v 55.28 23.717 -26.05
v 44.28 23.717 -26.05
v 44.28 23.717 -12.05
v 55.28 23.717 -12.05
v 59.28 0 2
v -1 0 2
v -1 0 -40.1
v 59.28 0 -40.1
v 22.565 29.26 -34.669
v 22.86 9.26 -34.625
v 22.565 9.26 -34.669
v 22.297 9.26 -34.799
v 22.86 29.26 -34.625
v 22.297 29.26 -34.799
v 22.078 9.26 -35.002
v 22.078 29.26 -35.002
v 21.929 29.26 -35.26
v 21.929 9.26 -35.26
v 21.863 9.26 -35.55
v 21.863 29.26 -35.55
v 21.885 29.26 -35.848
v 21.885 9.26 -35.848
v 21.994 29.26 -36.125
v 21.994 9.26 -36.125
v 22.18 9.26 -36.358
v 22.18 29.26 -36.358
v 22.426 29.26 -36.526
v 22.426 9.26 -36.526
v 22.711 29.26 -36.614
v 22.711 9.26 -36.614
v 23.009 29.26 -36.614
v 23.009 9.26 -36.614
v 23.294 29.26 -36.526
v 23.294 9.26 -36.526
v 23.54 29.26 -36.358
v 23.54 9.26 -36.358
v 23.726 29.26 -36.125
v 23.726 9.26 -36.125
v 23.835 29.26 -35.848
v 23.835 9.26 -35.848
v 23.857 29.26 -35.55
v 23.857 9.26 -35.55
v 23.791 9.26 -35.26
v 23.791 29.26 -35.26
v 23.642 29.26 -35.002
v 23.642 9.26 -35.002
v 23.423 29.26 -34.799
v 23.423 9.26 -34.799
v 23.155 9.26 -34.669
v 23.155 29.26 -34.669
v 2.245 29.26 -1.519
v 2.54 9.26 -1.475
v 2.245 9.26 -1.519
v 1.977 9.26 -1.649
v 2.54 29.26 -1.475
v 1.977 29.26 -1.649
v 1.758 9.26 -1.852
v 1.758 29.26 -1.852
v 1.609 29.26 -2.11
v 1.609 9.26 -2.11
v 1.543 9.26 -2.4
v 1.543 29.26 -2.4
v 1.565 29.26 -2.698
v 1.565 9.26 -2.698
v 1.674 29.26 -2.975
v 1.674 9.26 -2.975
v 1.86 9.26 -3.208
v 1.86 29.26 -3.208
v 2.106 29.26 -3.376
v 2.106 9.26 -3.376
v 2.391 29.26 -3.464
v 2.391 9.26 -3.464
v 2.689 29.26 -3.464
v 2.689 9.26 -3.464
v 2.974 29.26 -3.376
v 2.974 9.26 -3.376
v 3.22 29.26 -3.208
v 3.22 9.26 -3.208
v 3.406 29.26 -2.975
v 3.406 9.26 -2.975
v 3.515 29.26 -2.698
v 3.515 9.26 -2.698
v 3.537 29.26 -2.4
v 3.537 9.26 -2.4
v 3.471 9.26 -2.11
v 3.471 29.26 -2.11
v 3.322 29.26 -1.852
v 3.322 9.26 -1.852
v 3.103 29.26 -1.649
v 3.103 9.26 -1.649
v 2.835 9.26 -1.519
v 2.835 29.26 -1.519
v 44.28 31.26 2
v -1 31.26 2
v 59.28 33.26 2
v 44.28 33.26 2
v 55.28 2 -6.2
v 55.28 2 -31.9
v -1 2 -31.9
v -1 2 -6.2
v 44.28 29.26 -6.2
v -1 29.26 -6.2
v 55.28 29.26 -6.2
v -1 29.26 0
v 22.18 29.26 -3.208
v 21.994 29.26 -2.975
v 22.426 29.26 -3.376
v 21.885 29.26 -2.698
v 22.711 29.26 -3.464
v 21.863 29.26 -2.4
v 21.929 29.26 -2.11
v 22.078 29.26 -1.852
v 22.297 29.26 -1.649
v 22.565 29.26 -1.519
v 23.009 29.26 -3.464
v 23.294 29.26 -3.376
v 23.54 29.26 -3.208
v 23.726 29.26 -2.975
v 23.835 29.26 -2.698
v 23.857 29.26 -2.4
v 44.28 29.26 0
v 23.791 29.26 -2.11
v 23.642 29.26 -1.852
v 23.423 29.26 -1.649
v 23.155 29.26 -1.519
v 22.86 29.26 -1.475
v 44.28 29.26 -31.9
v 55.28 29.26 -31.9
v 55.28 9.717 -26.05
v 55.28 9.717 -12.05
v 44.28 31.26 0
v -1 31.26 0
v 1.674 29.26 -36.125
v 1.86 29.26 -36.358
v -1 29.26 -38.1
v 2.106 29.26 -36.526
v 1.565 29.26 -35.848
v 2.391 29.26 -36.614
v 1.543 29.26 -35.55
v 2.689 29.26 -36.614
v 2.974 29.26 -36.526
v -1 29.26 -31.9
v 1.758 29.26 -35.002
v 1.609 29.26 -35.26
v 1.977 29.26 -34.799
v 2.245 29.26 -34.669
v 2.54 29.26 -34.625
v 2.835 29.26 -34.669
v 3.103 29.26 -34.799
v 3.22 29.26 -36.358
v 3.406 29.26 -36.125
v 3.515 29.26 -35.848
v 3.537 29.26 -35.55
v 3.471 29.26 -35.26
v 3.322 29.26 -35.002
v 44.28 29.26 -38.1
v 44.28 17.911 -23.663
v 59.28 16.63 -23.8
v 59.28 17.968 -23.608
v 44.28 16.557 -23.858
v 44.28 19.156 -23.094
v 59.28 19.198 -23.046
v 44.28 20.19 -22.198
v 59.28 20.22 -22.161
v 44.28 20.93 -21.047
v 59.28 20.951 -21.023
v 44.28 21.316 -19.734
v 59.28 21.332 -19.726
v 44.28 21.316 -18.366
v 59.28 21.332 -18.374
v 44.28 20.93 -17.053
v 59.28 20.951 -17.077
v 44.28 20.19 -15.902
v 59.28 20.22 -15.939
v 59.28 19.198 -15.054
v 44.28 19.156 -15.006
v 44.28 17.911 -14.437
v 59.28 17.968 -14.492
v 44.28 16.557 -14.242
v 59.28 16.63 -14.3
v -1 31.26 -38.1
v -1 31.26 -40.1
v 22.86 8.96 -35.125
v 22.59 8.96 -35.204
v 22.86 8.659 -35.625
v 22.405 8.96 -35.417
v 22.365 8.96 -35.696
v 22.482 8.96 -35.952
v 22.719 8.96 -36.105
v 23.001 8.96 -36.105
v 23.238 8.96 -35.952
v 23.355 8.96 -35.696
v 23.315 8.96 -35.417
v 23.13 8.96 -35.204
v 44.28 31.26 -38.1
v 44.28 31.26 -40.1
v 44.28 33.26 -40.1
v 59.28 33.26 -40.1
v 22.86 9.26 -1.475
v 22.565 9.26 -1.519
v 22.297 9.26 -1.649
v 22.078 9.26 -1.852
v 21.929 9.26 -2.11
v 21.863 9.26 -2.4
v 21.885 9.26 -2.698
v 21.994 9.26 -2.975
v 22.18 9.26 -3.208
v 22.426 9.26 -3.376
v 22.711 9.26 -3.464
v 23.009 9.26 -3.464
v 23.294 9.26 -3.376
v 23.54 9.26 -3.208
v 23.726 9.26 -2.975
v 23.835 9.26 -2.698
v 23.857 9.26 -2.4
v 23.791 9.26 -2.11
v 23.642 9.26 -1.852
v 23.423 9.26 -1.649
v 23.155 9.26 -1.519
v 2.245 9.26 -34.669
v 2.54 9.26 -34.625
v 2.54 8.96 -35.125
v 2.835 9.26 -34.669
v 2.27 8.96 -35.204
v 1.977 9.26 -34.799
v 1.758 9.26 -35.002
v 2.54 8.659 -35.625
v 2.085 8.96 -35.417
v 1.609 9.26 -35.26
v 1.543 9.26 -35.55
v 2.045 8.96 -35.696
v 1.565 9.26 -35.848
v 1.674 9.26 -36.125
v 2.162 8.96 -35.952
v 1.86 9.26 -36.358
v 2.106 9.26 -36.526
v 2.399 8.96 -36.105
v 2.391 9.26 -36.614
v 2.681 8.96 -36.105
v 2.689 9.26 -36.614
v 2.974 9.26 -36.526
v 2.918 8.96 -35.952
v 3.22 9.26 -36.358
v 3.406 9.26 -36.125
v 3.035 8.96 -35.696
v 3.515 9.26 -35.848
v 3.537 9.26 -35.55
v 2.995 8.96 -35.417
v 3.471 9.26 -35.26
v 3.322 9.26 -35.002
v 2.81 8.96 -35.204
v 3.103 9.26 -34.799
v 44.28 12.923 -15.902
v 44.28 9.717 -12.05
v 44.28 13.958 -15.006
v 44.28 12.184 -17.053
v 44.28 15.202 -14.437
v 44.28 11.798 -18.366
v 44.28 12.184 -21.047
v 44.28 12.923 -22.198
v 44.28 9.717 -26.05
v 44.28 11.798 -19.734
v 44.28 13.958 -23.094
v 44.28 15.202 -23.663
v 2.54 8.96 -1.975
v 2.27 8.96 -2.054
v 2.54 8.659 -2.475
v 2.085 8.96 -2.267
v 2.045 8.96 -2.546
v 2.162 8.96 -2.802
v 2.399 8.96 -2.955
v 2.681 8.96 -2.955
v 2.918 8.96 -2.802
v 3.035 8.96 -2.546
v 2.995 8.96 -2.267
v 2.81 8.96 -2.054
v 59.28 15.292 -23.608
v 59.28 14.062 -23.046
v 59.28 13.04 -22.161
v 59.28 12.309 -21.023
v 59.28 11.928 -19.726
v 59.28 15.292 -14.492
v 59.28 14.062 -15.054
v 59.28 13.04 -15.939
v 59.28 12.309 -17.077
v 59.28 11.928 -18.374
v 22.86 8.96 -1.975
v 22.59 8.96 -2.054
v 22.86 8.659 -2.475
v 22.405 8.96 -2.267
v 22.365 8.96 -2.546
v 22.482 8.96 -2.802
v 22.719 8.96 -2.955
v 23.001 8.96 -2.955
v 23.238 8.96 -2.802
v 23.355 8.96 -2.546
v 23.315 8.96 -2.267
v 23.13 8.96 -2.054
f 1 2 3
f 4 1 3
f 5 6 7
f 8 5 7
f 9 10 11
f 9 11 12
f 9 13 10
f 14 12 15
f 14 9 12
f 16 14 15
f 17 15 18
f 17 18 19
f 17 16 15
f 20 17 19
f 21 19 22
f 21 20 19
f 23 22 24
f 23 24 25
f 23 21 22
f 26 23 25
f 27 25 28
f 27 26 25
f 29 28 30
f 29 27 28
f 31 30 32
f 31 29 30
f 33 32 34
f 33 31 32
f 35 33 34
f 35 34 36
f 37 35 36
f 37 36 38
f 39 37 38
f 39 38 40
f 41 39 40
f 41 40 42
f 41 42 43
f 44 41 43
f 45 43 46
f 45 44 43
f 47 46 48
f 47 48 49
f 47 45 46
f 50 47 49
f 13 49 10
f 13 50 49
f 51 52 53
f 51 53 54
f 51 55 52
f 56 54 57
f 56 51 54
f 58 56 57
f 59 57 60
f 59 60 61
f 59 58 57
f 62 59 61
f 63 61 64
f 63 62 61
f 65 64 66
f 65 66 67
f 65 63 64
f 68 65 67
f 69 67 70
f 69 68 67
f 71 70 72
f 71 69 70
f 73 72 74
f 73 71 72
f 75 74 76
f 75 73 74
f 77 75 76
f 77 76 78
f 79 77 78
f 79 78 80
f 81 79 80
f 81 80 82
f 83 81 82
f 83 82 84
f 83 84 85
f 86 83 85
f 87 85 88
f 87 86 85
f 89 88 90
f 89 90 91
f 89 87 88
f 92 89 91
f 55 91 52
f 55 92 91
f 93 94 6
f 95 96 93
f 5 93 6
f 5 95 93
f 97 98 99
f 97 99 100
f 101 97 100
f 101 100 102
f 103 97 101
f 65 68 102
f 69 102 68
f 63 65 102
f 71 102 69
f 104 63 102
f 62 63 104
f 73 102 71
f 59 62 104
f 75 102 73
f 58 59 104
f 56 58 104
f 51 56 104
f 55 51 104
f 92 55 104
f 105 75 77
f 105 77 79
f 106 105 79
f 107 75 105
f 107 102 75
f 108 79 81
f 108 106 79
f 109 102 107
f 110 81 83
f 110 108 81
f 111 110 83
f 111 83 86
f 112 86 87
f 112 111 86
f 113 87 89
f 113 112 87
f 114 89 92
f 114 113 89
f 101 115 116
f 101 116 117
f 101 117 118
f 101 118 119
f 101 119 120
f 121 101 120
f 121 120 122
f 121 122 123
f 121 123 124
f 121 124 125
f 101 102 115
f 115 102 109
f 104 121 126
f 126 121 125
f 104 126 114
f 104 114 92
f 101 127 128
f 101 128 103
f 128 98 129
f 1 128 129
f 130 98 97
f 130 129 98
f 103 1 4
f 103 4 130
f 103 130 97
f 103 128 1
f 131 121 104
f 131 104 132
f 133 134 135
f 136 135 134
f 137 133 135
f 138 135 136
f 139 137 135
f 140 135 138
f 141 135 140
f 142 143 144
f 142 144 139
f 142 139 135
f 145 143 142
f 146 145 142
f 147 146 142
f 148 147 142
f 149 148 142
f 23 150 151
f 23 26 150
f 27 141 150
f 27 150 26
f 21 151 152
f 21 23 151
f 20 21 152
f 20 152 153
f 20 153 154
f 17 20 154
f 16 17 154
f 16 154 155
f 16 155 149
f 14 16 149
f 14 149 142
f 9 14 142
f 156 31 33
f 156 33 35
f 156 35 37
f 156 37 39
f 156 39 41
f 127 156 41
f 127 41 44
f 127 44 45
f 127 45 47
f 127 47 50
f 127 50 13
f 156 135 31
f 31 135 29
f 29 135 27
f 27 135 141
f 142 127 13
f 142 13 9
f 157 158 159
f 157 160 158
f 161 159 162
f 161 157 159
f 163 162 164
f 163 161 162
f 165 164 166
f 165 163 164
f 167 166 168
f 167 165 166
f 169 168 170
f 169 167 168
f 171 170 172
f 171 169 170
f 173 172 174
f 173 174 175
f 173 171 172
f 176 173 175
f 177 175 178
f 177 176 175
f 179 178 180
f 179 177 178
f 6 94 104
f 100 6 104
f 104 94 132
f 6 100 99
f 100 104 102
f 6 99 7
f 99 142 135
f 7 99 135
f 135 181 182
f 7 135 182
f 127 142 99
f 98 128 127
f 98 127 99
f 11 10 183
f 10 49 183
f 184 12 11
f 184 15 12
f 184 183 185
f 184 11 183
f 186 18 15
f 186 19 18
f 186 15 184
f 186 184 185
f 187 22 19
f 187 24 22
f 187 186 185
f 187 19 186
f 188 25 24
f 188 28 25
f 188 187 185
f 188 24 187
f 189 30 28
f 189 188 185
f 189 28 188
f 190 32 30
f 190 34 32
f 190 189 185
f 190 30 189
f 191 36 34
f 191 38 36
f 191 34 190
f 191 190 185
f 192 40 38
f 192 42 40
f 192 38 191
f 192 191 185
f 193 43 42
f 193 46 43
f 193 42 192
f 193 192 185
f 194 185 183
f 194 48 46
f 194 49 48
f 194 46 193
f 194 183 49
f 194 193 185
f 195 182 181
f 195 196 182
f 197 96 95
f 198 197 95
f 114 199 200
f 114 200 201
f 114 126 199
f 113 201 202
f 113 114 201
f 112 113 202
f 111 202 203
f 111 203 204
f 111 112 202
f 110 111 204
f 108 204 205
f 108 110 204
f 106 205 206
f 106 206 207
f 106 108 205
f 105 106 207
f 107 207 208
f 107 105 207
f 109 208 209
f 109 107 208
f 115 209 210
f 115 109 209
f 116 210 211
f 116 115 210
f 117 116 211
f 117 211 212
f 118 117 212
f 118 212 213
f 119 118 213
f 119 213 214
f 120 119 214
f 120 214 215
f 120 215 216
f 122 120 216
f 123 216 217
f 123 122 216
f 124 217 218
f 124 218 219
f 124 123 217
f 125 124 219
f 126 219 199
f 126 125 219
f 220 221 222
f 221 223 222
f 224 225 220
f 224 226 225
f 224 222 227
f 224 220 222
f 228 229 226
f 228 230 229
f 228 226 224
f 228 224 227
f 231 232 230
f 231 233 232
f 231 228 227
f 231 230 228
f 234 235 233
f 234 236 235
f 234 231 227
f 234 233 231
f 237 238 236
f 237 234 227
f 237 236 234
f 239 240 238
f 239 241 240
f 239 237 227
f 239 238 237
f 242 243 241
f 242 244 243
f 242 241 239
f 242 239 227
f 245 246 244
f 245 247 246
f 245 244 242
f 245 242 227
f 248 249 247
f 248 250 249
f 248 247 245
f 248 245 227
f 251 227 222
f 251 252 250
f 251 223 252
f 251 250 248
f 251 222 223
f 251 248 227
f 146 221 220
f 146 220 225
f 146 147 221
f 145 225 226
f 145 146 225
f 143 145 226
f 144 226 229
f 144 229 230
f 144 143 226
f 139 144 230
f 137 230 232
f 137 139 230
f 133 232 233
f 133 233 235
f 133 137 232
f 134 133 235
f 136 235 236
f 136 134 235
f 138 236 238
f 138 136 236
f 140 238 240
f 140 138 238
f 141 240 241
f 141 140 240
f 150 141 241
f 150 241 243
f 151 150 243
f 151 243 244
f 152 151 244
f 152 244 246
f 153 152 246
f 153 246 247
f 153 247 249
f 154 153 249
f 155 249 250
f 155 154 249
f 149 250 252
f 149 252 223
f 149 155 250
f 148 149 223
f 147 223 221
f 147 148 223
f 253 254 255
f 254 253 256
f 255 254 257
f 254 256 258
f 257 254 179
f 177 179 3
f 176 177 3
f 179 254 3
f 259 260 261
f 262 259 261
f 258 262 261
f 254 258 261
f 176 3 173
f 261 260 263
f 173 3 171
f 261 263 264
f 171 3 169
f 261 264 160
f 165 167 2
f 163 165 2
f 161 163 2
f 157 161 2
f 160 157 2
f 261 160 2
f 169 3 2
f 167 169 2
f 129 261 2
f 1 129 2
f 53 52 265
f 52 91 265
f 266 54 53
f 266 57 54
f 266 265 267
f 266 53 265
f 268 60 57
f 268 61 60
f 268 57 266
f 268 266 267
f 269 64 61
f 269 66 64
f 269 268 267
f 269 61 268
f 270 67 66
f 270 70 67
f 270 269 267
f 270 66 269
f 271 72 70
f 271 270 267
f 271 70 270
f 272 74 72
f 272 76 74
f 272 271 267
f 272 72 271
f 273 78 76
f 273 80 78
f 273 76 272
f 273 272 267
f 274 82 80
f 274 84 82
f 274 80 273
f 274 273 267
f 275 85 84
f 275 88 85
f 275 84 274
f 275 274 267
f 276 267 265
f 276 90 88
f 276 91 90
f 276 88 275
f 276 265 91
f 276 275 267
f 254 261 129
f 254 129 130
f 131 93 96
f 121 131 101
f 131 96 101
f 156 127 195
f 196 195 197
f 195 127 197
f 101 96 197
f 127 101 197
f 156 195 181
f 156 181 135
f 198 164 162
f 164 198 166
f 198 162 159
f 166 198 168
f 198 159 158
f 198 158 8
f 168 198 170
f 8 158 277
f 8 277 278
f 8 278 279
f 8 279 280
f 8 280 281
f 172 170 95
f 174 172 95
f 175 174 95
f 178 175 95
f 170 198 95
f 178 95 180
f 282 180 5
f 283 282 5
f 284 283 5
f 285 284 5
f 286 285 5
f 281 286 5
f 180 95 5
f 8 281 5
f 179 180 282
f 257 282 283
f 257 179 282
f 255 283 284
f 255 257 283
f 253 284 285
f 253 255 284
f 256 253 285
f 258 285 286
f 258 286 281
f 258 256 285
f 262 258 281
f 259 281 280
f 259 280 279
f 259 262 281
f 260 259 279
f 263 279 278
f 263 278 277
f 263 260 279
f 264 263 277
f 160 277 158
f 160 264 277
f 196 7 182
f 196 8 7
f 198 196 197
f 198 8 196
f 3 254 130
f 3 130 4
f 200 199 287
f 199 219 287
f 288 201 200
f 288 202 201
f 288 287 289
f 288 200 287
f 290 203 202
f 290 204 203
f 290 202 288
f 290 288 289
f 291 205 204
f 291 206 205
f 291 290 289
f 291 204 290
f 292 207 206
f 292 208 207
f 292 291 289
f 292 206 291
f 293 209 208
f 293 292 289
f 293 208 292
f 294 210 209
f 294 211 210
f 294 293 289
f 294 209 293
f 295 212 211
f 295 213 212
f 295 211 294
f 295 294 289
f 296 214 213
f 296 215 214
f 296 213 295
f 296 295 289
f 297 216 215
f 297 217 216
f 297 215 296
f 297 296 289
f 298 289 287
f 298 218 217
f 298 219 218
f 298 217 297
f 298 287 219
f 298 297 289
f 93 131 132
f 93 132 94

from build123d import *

# Parameters (mm, degrees)
SKETCH1_W                      = 59.28
SKETCH1_H                      = 38.1
BOSS_EXTRUDE2_DEPTH            = 29.26
SKETCH2_W                      = 15
SKETCH2_H                      = 38.1
BOSS_EXTRUDE3_DEPTH            = 4
SKETCH4_W                      = 44.28
SKETCH4_H                      = 25.7
CUT_EXTRUDE7_DEPTH             = 27.26
SKETCH7_R                      = 4.75
SKETCH8_R                      = 4.807692308
BOSS_EXTRUDE4_DEPTH            = 2
BOSS_EXTRUDE5_DEPTH            = 2
SKETCH15_W                     = 44.28
SKETCH15_H                     = 2
CUT_EXTRUDE9_DEPTH             = 2
BOSS_EXTRUDE6_DEPTH            = 1
F_2_0MM_DOWEL_HOLE1_AT_2_COUNT = 2
F_2_0MM_DOWEL_HOLE1_AT_2_PITCH = 20.32
LPATTERN1_COUNT                = 2
LPATTERN1_PITCH                = 33.15
SKETCH20_W                     = 25.7
SKETCH20_H                     = 27.26
SKETCH20_W_2                   = 14
SKETCH20_H_2                   = 14
CUT_EXTRUDE10_DEPTH            = 11


with BuildPart() as part:
    # Sketch1 → Boss-Extrude2 (new body)
    with BuildSketch(Plane(origin=(0, 0, 0), x_dir=(1, 0, 0), z_dir=(0, 1, 0))):
        with Locations((29.64, 19.05)):
            Rectangle(SKETCH1_W, SKETCH1_H)
    extrude(amount=BOSS_EXTRUDE2_DEPTH)

    # Sketch2 → Boss-Extrude3 (add)
    with BuildSketch(Plane(origin=(0, 29.26, 0), x_dir=(1, 0, 0), z_dir=(0, 1, 0))):
        with Locations((51.78, 19.05)):
            Rectangle(SKETCH2_W, SKETCH2_H)
    extrude(amount=BOSS_EXTRUDE3_DEPTH)

    # Sketch4 → Cut-Extrude7 (cut)
    with BuildSketch(Plane(origin=(0, 29.26, 0), x_dir=(1, 0, 0), z_dir=(0, 1, 0))):
        with Locations((22.14, 19.05)):
            Rectangle(SKETCH4_W, SKETCH4_H)
    extrude(amount=-CUT_EXTRUDE7_DEPTH, mode=Mode.SUBTRACT)

    # Sketch7 → Cut-Loft2 section 0
    with BuildSketch(Plane(origin=(59.28, 0, 0), x_dir=(0, 0, -1), z_dir=(1, 0, 0))):
        with Locations((19.05, 16.63)):
            Circle(SKETCH7_R)
    # Sketch8 → Cut-Loft2 section 1
    with BuildSketch(Plane.ZY.offset(-44.28)):
        with Locations((-19.05, 16.556791368)):
            Circle(SKETCH8_R)
    loft(mode=Mode.SUBTRACT)

    # Sketch13 → Boss-Extrude4 (add)
    with BuildSketch(Plane.XY):
        Polygon((0, 29.26), (0, 0), (59.28, 0), (59.28, 29.26), (59.28, 33.26), (0, 33.26), align=None)
    extrude(amount=BOSS_EXTRUDE4_DEPTH)

    # Sketch14 → Boss-Extrude5 (add)
    with BuildSketch(Plane(origin=(0, 0, -38.1), x_dir=(-1, 0, 0), z_dir=(0, 0, -1))):
        Polygon((-59.28, 0), (0, 0), (0, 29.26), (0, 33.26), (-59.28, 33.26), (-59.28, 29.26), align=None)
    extrude(amount=BOSS_EXTRUDE5_DEPTH)

    # Sketch15 → Cut-Extrude9 (cut)
    with BuildSketch(Plane(origin=(0, 33.26, 0), x_dir=(1, 0, 0), z_dir=(0, 1, 0))):
        with Locations((22.14, -1)):
            Rectangle(SKETCH15_W, SKETCH15_H)
        with Locations((22.14, 39.1)):
            Rectangle(SKETCH15_W, SKETCH15_H)
    extrude(amount=-CUT_EXTRUDE9_DEPTH, mode=Mode.SUBTRACT)

    # Sketch16 → Boss-Extrude6 (add)
    with BuildSketch(Plane.ZY):
        Polygon((-40.1, 31.26), (-38.1, 31.26), (-38.1, 29.26), (-31.9, 29.26), (-31.9, 2), (-6.2, 2), (-6.2, 29.26), (0, 29.26), (0, 31.26), (2, 31.26), (2, 0), (-40.1, 0), align=None)
    extrude(amount=BOSS_EXTRUDE6_DEPTH)

    # Sketch18 → Ø2.0mm Dowel Hole1 (revolve, cut)
    with BuildSketch(Plane(origin=(2.54, 29.26, -2.475), x_dir=(0, 0, 1), z_dir=(1, 0, 0))):
        Polygon((0, 0), (0, 20.600860619), (1, 20), (1, 0), align=None)
    f_2_0mm_dowel_hole1 = revolve(axis=Axis((2.54, 35.61, -2.475), (0, -1, 0)), mode=Mode.SUBTRACT)

    # Ø2.0mm Dowel Hole1 at 2: Ø2.0mm Dowel Hole1 ×2
    with Locations(*[(i * F_2_0MM_DOWEL_HOLE1_AT_2_PITCH, 0, 0) for i in range(1, F_2_0MM_DOWEL_HOLE1_AT_2_COUNT)]):
        add(f_2_0mm_dowel_hole1, mode=Mode.SUBTRACT)

    # LPattern1: Ø2.0mm Dowel Hole1 ×2
    with Locations(*[(0, 0, -i * LPATTERN1_PITCH) for i in range(1, LPATTERN1_COUNT)]):
        add(f_2_0mm_dowel_hole1, mode=Mode.SUBTRACT)

    # LPattern1 copy 1 sketch → LPattern1 copy 1 (revolve, cut)
    with BuildSketch(Plane(origin=(22.86, 29.26, -35.625), x_dir=(0, 0, 1), z_dir=(1, 0, 0))):
        Polygon((0, 0), (0, 20.600860619), (1, 20), (1, 0), align=None)
    revolve(axis=Axis((22.86, 35.61, -35.625), (0, -1, 0)), mode=Mode.SUBTRACT)

    # Sketch20 → Cut-Extrude10 (cut)
    with BuildSketch(Plane.ZY.offset(-44.28)):
        with Locations((-19.05, 15.63)):
            Rectangle(SKETCH20_W, SKETCH20_H)
        with Locations((-19.05, 16.716836028)):
            Rectangle(SKETCH20_W_2, SKETCH20_H_2, mode=Mode.SUBTRACT)
    extrude(amount=-CUT_EXTRUDE10_DEPTH, mode=Mode.SUBTRACT)


solid = part.part
